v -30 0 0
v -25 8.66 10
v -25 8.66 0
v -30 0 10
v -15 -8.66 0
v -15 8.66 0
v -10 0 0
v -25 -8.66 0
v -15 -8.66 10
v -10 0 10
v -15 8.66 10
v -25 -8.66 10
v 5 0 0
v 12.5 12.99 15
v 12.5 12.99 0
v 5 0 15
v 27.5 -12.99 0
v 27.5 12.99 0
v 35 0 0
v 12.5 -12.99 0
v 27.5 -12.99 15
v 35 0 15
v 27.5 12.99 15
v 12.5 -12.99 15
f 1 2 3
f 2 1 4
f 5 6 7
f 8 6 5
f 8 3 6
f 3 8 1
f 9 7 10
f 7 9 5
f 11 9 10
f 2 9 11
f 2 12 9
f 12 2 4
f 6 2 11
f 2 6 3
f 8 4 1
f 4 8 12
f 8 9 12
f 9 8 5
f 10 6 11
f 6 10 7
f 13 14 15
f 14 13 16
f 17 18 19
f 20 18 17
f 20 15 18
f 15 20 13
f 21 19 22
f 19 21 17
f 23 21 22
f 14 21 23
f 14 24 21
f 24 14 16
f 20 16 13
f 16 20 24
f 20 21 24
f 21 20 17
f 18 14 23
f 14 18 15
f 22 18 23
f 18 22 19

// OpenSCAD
// file: ../../lib/shapes/hexagon.scad
// lib/shapes/hexagon.scad

/**
 * Creates a hexagon with the specified side length and height.
 *
 * @param side_length The length of each side of the hexagon.
 * @param height The height of the hexagon.
 */
module shapeHexagon(side_length = 10, height = 10) {
    linear_extrude(height = height)
    polygon(points = [
        [cos(0) * side_length, sin(0) * side_length],
        [cos(60) * side_length, sin(60) * side_length],
        [cos(120) * side_length, sin(120) * side_length],
        [cos(180) * side_length, sin(180) * side_length],
        [cos(240) * side_length, sin(240) * side_length],
        [cos(300) * side_length, sin(300) * side_length]
    ]);
}
// main file
// tests/shapes/test_hexagon.scad

use <../../lib/shapes/hexagon.scad>

module testHexagon() {
    translate([-20, 0, 0])
    shapeHexagon(side_length = 10, height = 10);

    translate([20, 0, 0])
    shapeHexagon(side_length = 15, height = 15);
}

// Run tests
testHexagon();
